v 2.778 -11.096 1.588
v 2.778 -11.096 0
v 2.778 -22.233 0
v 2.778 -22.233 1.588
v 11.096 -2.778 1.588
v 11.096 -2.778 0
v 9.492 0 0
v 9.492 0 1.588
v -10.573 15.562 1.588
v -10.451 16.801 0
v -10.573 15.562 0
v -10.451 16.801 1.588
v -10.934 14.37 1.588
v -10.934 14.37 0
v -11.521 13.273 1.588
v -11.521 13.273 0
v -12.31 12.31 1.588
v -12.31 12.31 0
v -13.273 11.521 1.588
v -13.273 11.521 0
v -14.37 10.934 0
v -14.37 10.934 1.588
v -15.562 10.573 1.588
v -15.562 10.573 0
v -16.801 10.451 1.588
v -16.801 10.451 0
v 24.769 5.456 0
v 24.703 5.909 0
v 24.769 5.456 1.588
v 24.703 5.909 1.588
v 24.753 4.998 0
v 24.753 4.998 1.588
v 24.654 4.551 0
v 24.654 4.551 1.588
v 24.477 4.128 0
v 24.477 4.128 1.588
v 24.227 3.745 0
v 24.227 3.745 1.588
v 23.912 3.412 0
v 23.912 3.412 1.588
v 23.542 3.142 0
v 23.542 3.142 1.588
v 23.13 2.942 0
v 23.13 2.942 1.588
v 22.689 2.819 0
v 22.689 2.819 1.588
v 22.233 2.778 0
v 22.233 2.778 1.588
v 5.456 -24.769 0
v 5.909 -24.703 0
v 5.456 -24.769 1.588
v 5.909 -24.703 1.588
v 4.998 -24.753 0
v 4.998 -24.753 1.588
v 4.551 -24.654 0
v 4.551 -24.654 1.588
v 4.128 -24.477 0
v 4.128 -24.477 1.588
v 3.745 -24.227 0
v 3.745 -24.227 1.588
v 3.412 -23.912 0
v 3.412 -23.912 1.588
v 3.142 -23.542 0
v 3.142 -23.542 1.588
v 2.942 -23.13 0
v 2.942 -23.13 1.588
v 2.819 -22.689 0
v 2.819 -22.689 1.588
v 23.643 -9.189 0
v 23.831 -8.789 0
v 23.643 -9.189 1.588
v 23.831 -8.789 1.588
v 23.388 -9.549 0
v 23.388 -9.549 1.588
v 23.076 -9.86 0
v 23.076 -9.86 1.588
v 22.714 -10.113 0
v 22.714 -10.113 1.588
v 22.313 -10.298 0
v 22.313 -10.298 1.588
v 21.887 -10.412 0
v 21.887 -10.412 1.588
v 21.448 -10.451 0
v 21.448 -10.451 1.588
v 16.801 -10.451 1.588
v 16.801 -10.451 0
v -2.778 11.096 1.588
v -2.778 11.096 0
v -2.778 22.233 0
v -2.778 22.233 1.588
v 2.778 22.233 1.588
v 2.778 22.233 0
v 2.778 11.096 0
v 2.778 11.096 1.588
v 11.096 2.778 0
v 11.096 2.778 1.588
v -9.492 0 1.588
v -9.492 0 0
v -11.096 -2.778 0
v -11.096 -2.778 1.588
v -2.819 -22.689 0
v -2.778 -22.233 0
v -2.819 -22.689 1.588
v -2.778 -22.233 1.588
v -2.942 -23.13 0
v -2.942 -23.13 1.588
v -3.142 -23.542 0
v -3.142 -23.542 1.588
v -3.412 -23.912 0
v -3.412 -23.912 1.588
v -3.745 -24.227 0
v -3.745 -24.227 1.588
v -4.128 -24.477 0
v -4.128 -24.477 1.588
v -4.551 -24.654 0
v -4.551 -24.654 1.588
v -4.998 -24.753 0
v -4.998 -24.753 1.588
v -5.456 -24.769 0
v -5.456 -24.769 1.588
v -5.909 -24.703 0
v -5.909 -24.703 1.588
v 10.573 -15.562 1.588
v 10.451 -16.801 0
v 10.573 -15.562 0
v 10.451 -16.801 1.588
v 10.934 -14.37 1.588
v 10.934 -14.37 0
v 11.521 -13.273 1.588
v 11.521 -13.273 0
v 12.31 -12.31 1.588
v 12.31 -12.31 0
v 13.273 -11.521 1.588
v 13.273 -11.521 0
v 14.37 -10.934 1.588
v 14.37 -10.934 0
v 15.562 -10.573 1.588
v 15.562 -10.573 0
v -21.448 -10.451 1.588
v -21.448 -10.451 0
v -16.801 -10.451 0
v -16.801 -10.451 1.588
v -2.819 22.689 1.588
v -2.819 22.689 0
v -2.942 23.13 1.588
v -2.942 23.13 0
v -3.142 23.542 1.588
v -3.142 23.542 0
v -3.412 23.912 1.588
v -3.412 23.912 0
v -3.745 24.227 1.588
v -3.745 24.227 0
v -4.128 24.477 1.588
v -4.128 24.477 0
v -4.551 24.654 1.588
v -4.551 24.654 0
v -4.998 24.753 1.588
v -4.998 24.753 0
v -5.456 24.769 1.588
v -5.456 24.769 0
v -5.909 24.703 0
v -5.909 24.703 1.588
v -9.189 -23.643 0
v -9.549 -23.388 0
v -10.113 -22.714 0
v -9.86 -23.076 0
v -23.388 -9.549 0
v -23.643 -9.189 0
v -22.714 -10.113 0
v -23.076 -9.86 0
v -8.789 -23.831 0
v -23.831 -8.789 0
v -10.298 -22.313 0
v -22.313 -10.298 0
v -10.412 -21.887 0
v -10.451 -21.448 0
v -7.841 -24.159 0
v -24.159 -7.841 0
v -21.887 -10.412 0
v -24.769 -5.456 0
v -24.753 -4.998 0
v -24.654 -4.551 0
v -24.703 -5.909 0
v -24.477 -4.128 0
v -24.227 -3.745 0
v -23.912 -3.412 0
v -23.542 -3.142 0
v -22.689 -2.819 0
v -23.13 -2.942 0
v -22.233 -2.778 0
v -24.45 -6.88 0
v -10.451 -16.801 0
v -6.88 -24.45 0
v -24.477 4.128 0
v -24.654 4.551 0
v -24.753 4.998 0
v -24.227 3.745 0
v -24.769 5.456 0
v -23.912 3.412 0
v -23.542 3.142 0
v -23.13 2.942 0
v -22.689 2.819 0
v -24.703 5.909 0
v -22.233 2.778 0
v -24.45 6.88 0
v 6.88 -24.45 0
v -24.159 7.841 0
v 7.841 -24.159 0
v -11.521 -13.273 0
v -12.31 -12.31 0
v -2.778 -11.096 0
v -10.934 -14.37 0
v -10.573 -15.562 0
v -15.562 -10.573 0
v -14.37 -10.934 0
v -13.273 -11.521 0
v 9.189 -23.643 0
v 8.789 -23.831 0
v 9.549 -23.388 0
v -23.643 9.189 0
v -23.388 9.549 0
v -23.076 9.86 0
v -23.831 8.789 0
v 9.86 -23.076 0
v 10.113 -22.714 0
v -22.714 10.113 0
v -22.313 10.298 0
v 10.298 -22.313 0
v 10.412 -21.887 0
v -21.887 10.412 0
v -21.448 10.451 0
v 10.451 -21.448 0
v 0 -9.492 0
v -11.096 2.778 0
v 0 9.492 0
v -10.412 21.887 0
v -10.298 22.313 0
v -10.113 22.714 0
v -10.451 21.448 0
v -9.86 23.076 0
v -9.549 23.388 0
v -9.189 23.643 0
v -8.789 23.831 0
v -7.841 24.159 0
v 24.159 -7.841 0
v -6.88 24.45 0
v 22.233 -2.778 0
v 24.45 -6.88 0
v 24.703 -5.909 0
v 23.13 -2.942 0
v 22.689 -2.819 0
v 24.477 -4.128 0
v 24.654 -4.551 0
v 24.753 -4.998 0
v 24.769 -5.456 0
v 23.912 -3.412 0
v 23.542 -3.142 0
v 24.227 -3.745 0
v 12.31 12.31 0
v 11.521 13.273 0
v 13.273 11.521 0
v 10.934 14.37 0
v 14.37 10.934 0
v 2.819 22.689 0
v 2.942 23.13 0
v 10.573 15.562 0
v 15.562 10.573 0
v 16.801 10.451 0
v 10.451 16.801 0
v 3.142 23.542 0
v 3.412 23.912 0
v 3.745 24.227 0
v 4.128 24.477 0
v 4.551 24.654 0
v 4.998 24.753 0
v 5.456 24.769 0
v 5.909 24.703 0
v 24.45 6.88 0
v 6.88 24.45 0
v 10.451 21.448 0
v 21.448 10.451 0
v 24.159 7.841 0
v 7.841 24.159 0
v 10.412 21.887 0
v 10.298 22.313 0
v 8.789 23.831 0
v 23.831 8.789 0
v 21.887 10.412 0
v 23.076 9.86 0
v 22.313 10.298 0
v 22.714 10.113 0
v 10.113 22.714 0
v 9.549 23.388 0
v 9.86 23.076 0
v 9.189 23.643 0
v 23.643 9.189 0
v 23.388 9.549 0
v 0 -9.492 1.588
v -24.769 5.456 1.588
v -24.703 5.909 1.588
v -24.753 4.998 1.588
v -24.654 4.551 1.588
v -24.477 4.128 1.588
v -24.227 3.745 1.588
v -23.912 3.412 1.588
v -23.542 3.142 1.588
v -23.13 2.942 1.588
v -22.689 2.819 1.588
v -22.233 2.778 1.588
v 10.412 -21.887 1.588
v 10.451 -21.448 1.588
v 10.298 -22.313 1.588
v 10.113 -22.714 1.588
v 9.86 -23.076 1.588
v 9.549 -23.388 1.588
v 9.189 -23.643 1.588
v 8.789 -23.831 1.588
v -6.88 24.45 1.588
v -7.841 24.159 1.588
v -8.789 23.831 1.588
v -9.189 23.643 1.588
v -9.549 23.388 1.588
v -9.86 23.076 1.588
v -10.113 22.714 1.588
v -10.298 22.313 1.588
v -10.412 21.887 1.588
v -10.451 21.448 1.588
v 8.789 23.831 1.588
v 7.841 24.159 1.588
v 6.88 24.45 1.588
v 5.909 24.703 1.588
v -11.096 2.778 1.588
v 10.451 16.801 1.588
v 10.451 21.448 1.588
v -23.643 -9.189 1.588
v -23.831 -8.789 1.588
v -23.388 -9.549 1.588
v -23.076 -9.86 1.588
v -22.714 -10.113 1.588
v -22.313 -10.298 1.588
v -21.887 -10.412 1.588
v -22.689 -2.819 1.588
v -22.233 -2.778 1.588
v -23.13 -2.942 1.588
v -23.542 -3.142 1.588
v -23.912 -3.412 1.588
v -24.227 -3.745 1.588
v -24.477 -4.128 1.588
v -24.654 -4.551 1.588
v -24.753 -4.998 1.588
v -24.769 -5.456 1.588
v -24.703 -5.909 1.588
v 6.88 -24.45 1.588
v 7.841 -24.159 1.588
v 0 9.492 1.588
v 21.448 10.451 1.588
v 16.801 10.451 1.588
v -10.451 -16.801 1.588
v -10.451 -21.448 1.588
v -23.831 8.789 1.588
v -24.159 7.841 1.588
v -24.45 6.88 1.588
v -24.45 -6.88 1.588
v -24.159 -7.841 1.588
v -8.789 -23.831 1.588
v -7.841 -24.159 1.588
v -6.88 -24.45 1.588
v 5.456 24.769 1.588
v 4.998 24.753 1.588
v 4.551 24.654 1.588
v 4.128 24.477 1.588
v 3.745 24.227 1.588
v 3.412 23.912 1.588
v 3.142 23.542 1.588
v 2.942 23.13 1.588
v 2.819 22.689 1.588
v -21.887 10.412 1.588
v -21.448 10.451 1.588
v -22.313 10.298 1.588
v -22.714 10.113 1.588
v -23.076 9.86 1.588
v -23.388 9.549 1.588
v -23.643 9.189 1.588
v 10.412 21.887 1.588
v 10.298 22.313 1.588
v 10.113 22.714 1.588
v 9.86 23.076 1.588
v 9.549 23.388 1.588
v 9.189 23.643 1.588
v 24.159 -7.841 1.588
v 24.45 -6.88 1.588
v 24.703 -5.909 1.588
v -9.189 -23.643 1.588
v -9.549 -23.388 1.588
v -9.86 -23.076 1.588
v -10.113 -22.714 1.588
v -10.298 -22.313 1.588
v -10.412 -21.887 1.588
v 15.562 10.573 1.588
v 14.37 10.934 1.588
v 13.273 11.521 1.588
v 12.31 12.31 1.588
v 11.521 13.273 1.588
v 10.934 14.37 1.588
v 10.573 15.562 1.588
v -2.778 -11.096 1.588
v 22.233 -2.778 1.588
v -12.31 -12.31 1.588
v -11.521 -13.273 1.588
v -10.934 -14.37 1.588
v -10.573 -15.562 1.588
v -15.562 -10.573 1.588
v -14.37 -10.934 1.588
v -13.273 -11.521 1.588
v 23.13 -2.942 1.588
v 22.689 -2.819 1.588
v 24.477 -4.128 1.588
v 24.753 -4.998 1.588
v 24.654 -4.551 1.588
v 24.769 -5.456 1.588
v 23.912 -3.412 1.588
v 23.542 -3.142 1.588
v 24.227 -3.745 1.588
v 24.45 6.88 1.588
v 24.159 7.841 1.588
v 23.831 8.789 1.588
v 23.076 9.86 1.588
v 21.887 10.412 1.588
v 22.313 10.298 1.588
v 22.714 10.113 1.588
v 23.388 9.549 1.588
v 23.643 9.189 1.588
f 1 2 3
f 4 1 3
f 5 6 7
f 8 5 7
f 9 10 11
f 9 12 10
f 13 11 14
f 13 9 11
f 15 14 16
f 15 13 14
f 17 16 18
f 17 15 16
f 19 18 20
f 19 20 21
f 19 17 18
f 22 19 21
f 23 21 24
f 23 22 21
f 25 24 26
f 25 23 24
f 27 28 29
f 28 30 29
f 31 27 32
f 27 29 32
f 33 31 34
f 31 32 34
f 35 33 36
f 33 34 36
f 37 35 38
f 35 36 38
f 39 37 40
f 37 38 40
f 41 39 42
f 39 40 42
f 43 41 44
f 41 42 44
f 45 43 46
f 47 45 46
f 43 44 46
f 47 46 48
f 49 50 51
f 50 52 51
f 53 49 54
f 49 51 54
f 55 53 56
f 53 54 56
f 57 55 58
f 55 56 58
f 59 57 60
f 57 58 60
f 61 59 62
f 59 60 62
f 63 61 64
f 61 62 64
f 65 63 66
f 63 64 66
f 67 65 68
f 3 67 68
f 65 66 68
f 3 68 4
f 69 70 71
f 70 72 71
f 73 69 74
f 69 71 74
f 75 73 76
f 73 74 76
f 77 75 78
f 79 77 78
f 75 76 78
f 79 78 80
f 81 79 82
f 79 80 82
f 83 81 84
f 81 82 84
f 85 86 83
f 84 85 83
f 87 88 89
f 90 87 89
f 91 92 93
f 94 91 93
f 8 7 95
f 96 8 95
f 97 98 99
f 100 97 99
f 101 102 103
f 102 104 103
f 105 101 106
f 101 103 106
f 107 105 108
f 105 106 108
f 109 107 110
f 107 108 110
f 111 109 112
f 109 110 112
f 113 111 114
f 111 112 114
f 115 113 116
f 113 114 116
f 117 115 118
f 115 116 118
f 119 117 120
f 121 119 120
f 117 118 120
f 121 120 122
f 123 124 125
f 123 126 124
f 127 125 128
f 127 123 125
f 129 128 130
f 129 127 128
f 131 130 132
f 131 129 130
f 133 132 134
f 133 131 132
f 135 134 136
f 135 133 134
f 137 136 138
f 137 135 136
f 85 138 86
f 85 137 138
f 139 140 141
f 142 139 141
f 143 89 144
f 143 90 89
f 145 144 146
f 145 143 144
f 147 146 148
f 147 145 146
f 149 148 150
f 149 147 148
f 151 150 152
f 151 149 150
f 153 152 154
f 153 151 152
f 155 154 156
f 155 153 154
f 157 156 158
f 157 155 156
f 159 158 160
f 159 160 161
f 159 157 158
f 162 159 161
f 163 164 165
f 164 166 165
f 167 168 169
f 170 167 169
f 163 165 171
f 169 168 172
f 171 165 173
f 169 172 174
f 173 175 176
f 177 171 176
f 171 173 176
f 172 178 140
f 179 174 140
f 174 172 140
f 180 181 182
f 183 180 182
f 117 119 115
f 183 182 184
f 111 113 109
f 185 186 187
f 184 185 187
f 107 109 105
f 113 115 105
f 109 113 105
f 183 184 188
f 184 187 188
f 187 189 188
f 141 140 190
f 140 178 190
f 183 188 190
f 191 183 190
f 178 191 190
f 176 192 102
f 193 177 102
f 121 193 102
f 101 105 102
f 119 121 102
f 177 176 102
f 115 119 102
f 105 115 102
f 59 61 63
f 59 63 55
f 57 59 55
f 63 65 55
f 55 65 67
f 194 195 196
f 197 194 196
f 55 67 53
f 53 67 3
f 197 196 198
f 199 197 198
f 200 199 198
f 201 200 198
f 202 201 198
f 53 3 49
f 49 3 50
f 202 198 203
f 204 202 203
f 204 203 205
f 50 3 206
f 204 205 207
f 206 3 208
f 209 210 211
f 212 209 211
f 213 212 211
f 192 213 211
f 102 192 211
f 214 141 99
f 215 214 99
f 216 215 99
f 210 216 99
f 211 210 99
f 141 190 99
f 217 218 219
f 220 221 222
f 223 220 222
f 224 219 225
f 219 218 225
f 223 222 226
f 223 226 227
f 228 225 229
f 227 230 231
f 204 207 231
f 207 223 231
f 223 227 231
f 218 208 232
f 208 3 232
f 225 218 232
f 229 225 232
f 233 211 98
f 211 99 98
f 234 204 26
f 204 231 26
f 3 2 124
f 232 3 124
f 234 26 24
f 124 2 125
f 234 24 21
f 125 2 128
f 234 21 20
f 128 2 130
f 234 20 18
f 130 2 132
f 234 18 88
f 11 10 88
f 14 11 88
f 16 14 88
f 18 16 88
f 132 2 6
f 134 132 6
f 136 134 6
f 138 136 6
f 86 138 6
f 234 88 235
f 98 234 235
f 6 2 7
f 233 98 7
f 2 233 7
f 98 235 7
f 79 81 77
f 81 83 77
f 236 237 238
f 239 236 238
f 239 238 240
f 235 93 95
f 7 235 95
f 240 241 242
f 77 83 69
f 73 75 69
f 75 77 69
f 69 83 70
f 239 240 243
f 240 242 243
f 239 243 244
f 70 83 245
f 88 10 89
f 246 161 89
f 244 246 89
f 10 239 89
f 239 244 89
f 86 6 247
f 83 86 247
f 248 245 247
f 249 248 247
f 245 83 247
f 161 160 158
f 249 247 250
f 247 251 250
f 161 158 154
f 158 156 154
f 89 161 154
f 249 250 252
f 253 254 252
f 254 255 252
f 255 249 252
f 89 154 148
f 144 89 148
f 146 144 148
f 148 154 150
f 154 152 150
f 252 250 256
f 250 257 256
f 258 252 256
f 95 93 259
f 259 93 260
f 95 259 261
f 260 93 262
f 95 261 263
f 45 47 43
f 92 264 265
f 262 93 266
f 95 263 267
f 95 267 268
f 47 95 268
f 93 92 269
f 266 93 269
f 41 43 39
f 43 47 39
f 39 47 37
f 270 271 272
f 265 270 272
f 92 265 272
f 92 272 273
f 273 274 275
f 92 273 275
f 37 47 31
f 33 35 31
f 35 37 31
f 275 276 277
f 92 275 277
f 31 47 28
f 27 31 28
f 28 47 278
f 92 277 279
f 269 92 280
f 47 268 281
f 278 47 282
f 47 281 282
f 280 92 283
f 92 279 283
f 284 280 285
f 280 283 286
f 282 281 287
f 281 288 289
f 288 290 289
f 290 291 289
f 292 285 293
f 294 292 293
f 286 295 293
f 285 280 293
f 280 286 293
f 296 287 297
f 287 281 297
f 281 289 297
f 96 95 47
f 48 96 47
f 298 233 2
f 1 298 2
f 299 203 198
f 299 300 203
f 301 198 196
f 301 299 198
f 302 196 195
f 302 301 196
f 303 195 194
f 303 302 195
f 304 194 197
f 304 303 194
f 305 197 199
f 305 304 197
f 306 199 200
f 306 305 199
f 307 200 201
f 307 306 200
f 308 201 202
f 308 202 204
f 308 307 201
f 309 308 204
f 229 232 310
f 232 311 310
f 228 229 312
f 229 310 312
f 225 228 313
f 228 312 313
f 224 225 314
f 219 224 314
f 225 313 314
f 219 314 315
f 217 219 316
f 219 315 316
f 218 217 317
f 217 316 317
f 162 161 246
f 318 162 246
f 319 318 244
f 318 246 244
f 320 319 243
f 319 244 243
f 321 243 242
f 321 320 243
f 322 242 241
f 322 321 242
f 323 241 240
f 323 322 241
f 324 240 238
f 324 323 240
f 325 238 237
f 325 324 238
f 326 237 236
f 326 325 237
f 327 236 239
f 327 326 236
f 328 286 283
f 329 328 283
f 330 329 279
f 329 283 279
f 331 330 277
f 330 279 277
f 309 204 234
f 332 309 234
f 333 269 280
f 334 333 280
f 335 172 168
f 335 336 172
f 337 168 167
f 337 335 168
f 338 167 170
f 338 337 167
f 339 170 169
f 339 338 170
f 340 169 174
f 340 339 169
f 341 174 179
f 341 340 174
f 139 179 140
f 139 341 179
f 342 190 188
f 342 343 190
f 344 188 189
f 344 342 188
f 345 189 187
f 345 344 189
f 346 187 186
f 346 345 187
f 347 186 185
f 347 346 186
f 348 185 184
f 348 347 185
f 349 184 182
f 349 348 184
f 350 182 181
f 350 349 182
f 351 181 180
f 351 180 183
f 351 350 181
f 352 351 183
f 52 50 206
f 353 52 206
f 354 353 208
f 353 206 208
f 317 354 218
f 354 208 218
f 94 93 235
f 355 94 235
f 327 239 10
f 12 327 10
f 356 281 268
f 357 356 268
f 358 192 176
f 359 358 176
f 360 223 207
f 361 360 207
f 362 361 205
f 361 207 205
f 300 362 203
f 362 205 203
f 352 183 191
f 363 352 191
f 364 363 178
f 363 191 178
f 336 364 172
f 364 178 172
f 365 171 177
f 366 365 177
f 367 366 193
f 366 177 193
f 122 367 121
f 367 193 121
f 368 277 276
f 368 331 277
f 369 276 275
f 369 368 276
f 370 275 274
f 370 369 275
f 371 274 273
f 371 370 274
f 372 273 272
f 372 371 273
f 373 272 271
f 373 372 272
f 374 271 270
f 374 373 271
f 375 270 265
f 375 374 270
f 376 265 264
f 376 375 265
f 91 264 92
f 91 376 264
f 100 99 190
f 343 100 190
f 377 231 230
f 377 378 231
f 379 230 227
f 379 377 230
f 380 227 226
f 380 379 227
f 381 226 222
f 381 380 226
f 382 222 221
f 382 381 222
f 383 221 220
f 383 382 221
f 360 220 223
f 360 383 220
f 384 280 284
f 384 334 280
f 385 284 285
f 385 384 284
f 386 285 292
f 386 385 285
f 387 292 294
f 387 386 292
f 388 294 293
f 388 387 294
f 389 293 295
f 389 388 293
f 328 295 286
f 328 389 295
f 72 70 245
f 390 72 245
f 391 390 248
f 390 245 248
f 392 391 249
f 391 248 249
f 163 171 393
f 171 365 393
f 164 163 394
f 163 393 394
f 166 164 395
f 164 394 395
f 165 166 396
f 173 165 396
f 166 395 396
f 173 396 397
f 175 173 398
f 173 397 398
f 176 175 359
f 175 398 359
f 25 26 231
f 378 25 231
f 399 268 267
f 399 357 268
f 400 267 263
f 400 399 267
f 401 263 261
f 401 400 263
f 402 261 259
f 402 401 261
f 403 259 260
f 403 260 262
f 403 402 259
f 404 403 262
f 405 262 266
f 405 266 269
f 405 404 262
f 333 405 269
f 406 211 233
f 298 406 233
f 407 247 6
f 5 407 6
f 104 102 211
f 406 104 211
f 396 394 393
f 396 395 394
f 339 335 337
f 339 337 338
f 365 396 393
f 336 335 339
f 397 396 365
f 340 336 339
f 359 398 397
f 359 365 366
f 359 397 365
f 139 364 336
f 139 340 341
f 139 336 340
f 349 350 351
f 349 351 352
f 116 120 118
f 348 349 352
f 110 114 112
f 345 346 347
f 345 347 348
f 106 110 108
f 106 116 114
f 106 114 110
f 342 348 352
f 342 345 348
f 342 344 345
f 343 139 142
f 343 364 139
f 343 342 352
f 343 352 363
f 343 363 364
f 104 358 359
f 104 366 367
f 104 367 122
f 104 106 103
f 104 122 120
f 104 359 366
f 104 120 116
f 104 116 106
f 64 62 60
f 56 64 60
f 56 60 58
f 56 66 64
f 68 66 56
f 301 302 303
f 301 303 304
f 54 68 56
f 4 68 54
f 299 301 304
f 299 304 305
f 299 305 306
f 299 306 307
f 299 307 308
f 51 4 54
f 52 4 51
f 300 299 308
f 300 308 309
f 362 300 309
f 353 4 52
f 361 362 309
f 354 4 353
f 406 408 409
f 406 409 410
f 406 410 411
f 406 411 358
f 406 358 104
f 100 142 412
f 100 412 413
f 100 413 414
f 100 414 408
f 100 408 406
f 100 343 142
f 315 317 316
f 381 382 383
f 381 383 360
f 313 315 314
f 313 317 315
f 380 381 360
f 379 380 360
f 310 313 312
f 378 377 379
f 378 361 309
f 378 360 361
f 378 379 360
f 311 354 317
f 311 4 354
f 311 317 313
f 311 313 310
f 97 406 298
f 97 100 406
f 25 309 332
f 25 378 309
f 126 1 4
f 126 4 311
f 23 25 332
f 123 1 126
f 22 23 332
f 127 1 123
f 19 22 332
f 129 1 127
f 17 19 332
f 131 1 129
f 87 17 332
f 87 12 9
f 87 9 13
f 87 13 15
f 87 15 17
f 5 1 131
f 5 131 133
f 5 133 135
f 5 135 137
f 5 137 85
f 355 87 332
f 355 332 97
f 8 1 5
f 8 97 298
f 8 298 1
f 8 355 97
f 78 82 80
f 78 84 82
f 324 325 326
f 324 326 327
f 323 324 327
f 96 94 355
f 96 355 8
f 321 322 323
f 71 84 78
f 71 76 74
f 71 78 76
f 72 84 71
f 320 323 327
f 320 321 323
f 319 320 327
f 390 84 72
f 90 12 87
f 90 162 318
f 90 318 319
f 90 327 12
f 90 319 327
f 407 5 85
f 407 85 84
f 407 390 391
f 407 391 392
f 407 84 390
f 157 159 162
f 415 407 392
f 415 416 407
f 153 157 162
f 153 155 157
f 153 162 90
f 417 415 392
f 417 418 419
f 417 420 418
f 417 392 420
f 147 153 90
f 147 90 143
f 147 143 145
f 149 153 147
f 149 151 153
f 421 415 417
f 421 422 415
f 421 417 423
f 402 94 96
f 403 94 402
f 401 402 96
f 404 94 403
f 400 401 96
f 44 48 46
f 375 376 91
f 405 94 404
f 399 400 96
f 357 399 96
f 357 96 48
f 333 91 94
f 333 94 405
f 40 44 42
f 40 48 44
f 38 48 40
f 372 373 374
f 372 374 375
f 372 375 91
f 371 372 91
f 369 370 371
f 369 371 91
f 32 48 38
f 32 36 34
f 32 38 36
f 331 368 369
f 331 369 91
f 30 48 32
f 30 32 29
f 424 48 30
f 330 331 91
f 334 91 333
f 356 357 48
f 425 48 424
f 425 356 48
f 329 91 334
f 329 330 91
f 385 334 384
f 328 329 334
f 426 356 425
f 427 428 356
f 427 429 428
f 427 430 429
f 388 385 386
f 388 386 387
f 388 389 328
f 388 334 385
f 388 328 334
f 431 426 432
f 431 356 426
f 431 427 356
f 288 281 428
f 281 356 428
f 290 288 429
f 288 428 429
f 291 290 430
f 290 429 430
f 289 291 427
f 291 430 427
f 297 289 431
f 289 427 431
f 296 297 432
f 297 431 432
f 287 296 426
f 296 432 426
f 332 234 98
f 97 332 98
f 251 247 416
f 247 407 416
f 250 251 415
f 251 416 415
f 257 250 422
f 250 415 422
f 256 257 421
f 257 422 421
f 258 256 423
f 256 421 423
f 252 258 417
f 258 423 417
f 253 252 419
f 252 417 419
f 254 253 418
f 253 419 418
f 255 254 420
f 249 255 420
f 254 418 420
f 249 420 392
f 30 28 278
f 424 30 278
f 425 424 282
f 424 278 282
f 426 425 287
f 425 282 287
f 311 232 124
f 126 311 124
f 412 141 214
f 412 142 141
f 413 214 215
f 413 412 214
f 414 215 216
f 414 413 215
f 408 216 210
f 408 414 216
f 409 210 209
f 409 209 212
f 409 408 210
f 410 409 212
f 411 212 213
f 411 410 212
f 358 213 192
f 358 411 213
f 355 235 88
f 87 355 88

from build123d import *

# Parameters (mm, degrees)
F1_DEPTH = 1.5875
F2_R     = 6.35
F3_R     = 2.54


# Not quite as in the source:
# - a feature names something its author has since deleted; it is built from what else it names


with BuildPart() as f1:
    # F0 (on Top) → F1 (new body)
    with BuildSketch(Plane.XY):
        with BuildLine():
            Line((14.3039512166, 2.778125), (25.2476141741, 2.778125))
            ThreePointArc((25.2476141741, 2.778125), (24.5012506268, 6.6969185243), (23.1505208253, 10.4505208253))
            Line((23.1505208253, 10.4505208253), (10.4505208253, 10.4505208253))
            Line((10.4505208253, 10.4505208253), (10.4505208253, 23.1505208253))
            ThreePointArc((10.4505208253, 23.1505208253), (6.6969185243, 24.5012506268), (2.778125, 25.2476141741))
            Line((2.778125, 25.2476141741), (2.778125, 14.3039512166))
            Line((2.778125, 14.3039512166), (2.778125, 11.0960487834))
            Line((2.778125, 11.0960487834), (0, 9.4920975668))
            Line((0, 9.4920975668), (-2.778125, 11.0960487834))
            Line((-2.778125, 11.0960487834), (-2.778125, 14.3039512166))
            Line((-2.778125, 14.3039512166), (-2.778125, 25.2476141741))
            ThreePointArc((-2.778125, 25.2476141741), (-6.6969185243, 24.5012506268), (-10.4505208253, 23.1505208253))
            Line((-10.4505208253, 23.1505208253), (-10.4505208253, 10.4505208253))
            Line((-10.4505208253, 10.4505208253), (-23.1505208253, 10.4505208253))
            ThreePointArc((-23.1505208253, 10.4505208253), (-24.5012506268, 6.6969185243), (-25.2476141741, 2.778125))
            Line((-25.2476141741, 2.778125), (-14.3039512166, 2.778125))
            Line((-14.3039512166, 2.778125), (-11.0960487834, 2.778125))
            Line((-11.0960487834, 2.778125), (-9.4920975668, 0))
            Line((-9.4920975668, 0), (-11.0960487834, -2.778125))
            Line((-11.0960487834, -2.778125), (-14.3039512166, -2.778125))
            Line((-14.3039512166, -2.778125), (-25.2476141741, -2.778125))
            ThreePointArc((-25.2476141741, -2.778125), (-24.5012506268, -6.6969185243), (-23.1505208253, -10.4505208253))
            Line((-23.1505208253, -10.4505208253), (-10.4505208253, -10.4505208253))
            Line((-10.4505208253, -10.4505208253), (-10.4505208253, -23.1505208253))
            ThreePointArc((-10.4505208253, -23.1505208253), (-6.6969185243, -24.5012506268), (-2.778125, -25.2476141741))
            Line((-2.778125, -25.2476141741), (-2.778125, -14.3039512166))
            Line((-2.778125, -14.3039512166), (-2.778125, -11.0960487834))
            Line((-2.778125, -11.0960487834), (0, -9.4920975668))
            Line((0, -9.4920975668), (2.778125, -11.0960487834))
            Line((2.778125, -11.0960487834), (2.778125, -14.3039512166))
            Line((2.778125, -14.3039512166), (2.778125, -25.2476141741))
            ThreePointArc((2.778125, -25.2476141741), (6.6969185243, -24.5012506268), (10.4505208253, -23.1505208253))
            Line((10.4505208253, -23.1505208253), (10.4505208253, -10.4505208253))
            Line((10.4505208253, -10.4505208253), (23.1505208253, -10.4505208253))
            ThreePointArc((23.1505208253, -10.4505208253), (24.5012506268, -6.6969185243), (25.2476141741, -2.778125))
            Line((25.2476141741, -2.778125), (14.3039512166, -2.778125))
            Line((14.3039512166, -2.778125), (11.0960487834, -2.778125))
            Line((11.0960487834, -2.778125), (9.4920975668, 0))
            Line((9.4920975668, 0), (11.0960487834, 2.778125))
            Line((11.0960487834, 2.778125), (14.3039512166, 2.778125))
        make_face()
    extrude(amount=F1_DEPTH)

    # F2
    f2_edges = [f1.edges().sort_by_distance(p)[0] for p in [
        (-10.450521, -10.450521, 0.79375),
        (10.450521, -10.450521, 0.79375),
        (10.450521, 10.450521, 0.79375),
        (-10.450521, 10.450521, 0.79375),
    ]]
    fillet(f2_edges, radius=F2_R)

    # F3
    f3_edges = [f1.edges().sort_by_distance(p)[0] for p in [
        (2.778125, 25.247614, 0.79375),
        (-2.778125, 25.247614, 0.79375),
        (25.247614, 2.778125, 0.79375),
        (25.247614, -2.778125, 0.79375),
        (2.778125, -25.247614, 0.79375),
        (-2.778125, -25.247614, 0.79375),
        (-25.247614, -2.778125, 0.79375),
        (-25.247614, 2.778125, 0.79375),
        (23.150521, 10.450521, 0.79375),
        (10.450521, -23.150521, 0.79375),
        (-10.450521, -23.150521, 0.79375),
        (-23.150521, -10.450521, 0.79375),
        (-23.150521, 10.450521, 0.79375),
        (-10.450521, 23.150521, 0.79375),
        (10.450521, 23.150521, 0.79375),
        (23.150521, -10.450521, 0.79375),
    ]]
    fillet(f3_edges, radius=F3_R)


solid = f1.part
